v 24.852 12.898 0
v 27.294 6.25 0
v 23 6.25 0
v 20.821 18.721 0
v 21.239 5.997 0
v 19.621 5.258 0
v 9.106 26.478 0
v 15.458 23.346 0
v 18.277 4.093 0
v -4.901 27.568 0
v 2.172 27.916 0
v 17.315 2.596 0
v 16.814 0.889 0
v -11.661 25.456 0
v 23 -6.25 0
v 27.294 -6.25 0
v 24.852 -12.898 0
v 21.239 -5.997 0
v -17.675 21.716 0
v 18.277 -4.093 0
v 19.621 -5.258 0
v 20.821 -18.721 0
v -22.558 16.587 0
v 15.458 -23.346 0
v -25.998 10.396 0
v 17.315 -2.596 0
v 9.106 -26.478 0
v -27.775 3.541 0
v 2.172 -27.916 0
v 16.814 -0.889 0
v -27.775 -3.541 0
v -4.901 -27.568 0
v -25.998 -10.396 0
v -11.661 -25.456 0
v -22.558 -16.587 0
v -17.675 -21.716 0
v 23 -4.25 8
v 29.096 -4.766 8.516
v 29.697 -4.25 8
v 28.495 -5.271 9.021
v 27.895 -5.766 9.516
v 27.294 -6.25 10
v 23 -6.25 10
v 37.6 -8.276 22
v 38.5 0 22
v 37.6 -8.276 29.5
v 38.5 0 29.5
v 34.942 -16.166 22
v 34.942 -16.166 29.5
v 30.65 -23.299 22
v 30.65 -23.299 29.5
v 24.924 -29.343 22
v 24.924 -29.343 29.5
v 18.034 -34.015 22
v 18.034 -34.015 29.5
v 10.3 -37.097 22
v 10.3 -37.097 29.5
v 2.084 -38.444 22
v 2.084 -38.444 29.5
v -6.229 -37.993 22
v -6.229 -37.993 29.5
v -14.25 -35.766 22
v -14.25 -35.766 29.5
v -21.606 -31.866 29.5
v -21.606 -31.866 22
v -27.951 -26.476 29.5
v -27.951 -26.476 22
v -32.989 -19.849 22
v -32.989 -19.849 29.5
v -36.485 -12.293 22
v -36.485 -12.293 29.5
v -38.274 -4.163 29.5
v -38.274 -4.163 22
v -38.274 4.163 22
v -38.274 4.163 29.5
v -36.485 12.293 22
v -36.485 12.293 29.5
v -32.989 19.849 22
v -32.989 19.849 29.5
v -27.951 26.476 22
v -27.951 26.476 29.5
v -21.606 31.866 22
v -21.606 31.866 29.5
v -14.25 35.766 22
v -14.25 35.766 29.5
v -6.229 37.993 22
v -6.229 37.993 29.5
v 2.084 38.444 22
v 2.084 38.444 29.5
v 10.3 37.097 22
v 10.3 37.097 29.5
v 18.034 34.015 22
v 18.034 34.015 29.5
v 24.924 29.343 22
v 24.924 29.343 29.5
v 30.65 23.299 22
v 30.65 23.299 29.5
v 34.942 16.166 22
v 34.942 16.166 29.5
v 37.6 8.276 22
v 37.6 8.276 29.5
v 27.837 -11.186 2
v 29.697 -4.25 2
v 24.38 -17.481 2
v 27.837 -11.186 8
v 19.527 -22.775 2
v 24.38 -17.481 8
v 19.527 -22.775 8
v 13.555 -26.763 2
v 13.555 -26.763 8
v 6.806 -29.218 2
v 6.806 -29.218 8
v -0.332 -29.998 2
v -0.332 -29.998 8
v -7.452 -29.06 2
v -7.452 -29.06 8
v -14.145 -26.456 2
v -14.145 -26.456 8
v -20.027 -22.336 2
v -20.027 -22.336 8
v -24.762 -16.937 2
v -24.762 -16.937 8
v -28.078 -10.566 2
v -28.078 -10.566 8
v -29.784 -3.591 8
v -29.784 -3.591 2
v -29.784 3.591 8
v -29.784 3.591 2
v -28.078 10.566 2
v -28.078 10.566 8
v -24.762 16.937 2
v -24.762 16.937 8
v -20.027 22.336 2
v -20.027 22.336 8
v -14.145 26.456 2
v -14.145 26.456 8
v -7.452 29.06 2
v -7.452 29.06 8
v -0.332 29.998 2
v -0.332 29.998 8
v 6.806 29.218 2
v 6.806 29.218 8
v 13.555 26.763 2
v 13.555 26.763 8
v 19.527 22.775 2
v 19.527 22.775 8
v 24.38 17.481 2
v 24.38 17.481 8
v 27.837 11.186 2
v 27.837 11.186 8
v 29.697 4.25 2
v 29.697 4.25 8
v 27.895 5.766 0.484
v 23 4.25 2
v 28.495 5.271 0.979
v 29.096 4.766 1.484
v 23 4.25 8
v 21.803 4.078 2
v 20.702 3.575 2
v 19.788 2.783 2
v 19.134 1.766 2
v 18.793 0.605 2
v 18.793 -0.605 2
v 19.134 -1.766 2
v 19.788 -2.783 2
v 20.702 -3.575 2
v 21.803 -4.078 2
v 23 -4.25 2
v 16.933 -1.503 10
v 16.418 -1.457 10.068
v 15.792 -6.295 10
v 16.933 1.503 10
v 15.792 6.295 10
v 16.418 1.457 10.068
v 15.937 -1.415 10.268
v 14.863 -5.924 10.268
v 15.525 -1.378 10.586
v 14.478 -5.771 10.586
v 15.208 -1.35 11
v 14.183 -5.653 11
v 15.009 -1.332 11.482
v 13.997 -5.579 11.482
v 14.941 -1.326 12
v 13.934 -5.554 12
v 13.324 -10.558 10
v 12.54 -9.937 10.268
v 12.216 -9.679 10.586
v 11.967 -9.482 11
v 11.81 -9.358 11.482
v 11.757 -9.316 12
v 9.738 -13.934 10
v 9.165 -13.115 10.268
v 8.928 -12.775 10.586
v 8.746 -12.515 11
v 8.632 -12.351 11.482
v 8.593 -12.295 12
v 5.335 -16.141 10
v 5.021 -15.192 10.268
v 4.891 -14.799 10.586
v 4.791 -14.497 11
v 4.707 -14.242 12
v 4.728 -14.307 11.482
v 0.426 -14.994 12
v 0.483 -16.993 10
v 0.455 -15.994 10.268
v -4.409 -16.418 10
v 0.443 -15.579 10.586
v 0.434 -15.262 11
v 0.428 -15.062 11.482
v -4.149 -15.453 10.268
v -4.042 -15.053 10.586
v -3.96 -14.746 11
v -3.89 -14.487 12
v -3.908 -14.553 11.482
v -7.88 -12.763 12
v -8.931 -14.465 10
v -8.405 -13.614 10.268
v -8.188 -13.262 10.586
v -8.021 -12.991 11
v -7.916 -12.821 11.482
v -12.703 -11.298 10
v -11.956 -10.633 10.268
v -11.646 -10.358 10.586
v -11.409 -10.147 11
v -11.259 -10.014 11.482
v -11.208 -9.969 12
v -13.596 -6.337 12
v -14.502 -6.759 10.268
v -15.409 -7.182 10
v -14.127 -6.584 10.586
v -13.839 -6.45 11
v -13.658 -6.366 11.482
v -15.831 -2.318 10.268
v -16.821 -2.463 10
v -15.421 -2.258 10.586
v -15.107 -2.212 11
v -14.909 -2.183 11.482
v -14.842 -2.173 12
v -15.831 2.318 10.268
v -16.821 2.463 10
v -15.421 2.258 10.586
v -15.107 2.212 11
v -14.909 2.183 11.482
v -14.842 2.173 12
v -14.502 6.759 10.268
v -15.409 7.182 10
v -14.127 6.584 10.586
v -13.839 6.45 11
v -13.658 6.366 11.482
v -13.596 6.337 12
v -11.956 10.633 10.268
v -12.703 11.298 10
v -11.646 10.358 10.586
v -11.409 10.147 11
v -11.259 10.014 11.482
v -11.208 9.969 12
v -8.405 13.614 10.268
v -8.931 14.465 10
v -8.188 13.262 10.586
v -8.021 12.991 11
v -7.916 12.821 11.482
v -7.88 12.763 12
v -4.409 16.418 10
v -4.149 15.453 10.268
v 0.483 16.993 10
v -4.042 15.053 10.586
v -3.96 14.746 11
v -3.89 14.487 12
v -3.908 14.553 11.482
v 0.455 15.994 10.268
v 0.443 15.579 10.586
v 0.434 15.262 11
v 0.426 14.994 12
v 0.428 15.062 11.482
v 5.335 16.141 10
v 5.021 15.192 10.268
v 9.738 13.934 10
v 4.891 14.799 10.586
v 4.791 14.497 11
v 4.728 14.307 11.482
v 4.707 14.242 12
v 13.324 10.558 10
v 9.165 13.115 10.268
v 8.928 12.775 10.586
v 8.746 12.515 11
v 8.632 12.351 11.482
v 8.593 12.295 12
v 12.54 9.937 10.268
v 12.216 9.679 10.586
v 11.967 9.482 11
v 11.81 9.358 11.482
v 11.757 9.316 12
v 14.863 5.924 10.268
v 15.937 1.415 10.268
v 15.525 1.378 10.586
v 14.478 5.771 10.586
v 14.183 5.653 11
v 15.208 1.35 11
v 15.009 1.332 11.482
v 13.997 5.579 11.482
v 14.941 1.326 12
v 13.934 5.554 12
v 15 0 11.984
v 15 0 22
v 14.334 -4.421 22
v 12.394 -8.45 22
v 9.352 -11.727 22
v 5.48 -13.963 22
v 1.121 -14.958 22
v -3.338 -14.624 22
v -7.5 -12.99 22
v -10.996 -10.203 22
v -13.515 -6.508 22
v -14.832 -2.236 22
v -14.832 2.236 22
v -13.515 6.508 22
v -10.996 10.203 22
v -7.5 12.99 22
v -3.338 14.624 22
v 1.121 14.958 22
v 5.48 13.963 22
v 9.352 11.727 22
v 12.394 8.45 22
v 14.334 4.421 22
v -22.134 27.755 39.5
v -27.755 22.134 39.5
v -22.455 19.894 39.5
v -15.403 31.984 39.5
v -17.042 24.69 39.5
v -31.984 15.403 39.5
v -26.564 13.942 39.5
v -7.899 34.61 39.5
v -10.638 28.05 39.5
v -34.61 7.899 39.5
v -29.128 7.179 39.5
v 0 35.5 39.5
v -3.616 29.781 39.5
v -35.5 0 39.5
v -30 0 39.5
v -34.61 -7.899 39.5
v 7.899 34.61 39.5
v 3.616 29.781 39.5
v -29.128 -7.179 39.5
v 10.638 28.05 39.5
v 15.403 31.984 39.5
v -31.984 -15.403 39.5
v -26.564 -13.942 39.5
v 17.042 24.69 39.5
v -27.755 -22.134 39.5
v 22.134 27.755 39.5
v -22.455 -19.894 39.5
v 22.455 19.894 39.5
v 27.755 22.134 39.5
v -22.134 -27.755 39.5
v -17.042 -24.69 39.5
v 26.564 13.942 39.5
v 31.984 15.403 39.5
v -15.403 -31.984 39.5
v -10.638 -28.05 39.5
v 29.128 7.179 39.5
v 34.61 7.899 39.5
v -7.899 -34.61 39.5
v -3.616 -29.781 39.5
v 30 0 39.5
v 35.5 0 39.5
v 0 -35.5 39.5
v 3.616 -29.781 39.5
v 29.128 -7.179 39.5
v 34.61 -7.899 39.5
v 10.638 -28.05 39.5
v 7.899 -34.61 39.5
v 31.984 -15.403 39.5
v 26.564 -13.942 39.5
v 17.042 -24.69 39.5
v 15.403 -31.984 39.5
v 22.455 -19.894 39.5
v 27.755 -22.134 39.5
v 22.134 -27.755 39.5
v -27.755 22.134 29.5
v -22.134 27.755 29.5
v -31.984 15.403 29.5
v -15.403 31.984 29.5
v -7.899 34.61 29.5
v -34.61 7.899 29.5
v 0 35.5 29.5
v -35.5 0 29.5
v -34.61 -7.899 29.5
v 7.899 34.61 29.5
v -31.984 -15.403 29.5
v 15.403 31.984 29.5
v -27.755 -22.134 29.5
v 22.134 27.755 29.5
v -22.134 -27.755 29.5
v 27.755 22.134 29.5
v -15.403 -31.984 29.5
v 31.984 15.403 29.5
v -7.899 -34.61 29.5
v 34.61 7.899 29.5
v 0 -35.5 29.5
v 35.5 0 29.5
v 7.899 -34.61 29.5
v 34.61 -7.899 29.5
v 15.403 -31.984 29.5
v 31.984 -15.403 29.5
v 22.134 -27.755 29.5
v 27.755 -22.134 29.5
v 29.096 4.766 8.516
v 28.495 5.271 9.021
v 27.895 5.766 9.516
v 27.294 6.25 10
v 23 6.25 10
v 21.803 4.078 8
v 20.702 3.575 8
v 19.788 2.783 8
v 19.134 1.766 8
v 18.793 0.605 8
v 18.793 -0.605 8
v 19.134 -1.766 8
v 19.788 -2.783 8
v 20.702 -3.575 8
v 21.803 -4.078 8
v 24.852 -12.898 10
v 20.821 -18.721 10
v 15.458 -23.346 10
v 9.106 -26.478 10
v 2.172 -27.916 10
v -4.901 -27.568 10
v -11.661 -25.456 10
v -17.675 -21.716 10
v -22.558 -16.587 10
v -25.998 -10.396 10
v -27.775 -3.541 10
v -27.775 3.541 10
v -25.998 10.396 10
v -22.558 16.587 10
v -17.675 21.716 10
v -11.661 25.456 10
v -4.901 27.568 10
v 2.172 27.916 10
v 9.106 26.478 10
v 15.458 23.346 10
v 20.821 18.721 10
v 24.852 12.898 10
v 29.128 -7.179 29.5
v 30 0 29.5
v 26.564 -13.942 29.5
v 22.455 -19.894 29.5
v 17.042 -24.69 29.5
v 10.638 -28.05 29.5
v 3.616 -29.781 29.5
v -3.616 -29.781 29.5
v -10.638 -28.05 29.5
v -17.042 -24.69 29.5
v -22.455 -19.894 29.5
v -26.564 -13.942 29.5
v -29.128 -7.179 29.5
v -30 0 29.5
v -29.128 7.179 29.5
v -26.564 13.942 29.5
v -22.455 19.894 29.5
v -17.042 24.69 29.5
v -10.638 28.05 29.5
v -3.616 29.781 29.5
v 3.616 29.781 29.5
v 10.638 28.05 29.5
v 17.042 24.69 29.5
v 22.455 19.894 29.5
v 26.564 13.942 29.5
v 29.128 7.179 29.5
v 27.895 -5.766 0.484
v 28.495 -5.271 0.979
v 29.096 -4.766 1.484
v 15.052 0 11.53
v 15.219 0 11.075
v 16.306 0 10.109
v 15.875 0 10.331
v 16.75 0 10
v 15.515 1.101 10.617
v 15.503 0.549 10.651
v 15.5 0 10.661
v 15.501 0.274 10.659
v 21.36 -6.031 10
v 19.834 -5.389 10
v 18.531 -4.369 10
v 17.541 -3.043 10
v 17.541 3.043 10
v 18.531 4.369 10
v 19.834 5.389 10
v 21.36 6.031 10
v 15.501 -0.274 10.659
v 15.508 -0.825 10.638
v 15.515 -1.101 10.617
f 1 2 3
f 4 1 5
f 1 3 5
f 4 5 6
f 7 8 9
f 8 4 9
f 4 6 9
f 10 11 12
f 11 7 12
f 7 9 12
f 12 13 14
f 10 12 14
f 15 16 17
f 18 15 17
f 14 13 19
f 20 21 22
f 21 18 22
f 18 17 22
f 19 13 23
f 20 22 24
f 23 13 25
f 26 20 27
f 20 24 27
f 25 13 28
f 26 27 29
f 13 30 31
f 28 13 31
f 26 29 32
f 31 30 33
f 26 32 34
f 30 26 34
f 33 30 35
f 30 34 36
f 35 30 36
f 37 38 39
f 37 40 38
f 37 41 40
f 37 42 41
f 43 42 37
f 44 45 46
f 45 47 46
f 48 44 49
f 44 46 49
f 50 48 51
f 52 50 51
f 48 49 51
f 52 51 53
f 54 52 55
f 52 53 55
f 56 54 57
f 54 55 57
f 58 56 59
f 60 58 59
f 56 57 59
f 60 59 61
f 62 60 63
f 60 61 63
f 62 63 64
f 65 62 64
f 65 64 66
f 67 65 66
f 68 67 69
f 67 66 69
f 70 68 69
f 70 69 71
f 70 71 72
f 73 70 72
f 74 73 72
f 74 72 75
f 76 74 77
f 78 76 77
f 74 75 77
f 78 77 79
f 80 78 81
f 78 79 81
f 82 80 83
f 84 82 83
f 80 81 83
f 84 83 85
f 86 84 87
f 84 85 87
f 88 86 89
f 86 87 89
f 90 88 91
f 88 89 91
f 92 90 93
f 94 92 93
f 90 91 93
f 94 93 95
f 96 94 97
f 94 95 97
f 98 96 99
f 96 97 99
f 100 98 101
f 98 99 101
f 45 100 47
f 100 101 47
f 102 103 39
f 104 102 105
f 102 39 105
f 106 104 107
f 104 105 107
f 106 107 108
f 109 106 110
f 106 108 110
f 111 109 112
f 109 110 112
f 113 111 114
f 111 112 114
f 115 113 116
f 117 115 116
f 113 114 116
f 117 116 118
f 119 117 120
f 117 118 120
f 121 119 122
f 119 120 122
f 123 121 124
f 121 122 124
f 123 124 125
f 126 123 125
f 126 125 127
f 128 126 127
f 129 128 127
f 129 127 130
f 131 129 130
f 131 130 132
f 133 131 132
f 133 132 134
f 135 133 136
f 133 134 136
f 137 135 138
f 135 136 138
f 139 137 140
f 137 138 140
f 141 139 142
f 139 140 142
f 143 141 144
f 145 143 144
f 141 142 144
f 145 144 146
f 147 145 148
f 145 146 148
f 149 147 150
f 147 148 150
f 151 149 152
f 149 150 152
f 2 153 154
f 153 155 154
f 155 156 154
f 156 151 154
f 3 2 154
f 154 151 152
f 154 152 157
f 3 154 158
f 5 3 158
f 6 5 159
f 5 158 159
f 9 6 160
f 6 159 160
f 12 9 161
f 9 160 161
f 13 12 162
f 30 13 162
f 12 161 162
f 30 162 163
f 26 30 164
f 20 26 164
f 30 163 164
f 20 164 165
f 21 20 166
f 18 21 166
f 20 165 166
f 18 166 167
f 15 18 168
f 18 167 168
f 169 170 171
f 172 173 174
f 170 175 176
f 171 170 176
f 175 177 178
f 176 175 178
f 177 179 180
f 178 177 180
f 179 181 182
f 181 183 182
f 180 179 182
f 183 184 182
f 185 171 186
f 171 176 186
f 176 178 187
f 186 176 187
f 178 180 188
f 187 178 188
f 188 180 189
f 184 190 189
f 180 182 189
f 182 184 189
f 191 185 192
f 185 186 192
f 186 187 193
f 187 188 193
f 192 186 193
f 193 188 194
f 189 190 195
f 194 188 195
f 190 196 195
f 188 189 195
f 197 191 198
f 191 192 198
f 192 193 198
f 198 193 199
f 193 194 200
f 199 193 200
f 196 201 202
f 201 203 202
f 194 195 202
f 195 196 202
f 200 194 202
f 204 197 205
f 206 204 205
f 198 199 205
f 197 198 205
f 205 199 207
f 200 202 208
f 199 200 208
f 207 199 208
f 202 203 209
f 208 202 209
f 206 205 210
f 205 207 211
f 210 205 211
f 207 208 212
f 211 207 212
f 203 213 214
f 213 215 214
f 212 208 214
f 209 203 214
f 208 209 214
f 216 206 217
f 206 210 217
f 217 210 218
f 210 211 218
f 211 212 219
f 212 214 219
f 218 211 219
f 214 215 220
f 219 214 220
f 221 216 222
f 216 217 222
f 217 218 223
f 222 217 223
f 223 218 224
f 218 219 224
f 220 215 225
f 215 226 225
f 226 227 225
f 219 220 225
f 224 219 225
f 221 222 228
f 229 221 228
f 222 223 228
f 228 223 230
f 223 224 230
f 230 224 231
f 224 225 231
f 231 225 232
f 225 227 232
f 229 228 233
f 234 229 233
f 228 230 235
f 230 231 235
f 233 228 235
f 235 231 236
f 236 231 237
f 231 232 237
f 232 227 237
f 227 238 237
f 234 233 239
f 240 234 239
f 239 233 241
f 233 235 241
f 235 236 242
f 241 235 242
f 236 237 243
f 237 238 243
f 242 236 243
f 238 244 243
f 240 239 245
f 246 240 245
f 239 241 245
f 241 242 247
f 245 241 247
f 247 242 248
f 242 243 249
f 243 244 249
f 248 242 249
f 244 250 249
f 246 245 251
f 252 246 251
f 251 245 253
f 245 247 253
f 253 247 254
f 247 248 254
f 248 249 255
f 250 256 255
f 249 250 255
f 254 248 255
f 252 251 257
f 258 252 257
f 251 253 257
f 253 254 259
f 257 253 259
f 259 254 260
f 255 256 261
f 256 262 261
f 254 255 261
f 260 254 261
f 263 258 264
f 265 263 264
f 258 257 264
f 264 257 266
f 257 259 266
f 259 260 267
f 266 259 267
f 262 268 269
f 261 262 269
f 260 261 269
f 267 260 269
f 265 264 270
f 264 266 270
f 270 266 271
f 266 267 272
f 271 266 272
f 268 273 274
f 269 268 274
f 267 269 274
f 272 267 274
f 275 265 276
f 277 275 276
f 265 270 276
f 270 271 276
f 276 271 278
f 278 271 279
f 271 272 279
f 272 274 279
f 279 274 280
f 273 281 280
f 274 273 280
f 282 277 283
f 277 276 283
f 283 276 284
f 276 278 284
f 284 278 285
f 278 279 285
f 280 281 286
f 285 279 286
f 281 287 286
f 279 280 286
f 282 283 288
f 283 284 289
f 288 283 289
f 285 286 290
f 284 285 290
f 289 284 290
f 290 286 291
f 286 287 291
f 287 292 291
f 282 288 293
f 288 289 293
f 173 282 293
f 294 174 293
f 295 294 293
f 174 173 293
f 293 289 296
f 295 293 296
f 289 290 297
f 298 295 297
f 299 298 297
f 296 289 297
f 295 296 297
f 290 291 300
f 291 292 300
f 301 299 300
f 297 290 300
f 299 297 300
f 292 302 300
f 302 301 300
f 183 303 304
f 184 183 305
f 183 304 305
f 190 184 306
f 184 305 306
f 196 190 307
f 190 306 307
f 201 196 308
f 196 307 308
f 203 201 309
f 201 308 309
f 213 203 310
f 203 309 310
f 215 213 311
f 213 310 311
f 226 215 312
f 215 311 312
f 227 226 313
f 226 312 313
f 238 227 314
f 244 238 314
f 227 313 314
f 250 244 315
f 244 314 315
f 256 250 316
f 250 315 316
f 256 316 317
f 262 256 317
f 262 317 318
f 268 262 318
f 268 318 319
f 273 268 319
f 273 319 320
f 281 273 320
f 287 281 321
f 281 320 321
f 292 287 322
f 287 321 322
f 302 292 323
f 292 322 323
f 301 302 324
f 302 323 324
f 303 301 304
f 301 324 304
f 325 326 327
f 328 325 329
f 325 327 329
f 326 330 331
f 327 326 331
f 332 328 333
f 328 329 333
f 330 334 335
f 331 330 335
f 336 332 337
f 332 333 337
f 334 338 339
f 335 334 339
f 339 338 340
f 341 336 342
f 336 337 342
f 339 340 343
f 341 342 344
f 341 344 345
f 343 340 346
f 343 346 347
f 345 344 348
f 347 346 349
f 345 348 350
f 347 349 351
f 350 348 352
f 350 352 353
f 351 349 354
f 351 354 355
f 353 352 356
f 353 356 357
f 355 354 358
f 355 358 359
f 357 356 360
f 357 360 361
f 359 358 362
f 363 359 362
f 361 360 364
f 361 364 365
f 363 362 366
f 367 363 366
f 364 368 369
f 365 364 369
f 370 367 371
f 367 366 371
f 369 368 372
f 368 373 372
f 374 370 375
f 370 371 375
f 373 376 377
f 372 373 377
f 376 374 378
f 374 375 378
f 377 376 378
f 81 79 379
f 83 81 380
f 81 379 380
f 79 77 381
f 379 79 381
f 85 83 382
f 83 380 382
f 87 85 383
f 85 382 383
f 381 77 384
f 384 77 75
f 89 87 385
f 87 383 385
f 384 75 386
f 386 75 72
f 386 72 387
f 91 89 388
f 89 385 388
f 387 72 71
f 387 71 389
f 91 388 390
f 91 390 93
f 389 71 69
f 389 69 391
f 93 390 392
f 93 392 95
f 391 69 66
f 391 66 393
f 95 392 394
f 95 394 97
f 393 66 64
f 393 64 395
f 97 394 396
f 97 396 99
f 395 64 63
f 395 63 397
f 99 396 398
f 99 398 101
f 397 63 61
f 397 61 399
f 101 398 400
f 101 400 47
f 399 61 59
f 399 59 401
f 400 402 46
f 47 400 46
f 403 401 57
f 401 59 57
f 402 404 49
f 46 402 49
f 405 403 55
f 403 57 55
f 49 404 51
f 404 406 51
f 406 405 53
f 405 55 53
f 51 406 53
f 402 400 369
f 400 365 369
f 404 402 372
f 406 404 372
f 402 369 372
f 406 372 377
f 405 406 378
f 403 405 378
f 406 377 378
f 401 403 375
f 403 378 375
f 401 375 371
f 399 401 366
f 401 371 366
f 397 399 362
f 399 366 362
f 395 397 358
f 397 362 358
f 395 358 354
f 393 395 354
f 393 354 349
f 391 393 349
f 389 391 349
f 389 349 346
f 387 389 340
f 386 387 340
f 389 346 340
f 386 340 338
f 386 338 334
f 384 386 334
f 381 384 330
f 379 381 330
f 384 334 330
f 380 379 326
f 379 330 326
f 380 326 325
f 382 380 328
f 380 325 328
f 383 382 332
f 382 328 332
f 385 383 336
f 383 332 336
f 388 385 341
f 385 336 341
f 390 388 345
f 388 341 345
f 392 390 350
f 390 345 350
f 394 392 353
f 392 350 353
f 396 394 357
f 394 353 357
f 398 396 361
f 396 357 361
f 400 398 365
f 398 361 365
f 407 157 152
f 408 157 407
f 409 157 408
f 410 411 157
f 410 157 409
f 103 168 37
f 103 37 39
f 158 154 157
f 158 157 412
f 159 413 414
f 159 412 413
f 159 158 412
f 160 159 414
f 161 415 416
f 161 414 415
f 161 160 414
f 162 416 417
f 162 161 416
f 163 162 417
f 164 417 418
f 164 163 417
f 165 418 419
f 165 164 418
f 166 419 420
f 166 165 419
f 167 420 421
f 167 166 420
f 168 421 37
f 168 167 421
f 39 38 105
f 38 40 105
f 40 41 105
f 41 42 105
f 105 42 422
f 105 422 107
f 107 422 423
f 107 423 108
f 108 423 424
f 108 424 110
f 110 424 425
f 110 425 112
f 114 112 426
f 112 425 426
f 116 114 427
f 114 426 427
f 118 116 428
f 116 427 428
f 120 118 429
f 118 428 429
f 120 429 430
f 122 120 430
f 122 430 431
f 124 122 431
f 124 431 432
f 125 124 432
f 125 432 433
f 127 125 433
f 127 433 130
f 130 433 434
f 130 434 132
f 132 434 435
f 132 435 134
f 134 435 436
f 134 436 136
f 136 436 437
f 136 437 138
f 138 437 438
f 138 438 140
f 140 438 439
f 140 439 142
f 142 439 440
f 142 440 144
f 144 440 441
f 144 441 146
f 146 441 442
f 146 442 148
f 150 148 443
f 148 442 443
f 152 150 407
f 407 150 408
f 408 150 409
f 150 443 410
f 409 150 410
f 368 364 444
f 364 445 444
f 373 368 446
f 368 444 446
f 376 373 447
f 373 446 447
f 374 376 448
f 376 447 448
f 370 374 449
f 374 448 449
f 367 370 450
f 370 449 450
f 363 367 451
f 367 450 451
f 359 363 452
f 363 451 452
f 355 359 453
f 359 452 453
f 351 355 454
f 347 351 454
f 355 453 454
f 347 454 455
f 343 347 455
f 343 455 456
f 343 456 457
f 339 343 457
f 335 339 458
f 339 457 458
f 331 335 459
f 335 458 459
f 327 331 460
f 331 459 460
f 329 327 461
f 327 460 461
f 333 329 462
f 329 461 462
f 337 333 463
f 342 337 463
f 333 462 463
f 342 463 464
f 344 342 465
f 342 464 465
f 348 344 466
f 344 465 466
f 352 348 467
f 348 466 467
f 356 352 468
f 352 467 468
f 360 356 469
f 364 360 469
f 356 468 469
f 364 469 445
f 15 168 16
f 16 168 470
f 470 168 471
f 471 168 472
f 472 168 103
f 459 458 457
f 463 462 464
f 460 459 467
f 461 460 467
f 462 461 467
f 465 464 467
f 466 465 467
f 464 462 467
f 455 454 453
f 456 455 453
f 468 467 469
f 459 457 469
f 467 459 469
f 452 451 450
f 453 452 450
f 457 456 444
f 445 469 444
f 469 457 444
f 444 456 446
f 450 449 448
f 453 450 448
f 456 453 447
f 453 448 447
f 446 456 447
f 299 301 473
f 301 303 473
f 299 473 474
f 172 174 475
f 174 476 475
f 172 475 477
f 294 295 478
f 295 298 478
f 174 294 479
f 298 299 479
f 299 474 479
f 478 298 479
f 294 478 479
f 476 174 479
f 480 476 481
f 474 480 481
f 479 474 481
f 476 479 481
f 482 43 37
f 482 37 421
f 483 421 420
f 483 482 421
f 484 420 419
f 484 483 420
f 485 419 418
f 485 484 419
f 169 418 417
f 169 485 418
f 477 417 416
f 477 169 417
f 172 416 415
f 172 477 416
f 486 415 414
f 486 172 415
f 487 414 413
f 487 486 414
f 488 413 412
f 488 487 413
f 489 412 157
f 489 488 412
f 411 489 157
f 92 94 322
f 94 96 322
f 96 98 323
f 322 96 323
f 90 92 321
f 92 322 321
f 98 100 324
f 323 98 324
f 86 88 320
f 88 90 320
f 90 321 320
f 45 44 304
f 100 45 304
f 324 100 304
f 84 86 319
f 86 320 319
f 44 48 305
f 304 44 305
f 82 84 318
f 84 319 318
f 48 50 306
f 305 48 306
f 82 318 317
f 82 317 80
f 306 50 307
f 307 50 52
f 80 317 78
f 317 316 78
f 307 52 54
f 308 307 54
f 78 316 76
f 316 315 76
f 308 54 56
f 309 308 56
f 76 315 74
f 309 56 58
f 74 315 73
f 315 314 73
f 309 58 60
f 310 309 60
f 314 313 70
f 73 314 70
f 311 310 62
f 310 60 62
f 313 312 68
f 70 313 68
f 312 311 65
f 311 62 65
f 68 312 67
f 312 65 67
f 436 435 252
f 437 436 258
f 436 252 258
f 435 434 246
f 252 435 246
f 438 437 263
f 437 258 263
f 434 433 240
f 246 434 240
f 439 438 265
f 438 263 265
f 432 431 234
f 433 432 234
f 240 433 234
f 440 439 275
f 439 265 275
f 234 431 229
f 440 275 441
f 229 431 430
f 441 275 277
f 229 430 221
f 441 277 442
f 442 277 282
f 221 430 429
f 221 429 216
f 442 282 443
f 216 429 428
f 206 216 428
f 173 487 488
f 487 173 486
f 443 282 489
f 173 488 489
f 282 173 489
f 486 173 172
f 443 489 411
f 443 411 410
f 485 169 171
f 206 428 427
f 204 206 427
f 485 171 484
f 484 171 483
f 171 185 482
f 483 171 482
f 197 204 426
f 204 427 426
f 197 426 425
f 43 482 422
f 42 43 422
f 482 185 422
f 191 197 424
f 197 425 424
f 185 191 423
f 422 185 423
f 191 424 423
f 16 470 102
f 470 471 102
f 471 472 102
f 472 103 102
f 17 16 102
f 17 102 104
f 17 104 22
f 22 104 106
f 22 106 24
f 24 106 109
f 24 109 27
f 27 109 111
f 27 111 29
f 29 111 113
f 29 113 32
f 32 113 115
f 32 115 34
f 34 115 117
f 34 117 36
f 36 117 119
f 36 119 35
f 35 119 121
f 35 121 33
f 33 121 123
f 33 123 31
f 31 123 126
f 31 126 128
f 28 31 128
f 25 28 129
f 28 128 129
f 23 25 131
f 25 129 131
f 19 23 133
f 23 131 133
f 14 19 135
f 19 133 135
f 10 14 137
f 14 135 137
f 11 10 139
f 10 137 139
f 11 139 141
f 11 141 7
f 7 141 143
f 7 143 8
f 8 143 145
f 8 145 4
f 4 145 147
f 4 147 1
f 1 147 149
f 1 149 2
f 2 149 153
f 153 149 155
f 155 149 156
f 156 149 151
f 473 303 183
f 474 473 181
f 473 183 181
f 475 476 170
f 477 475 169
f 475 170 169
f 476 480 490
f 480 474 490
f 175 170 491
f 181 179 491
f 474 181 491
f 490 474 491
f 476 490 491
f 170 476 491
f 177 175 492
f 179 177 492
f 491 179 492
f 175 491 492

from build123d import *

# Parameters (mm, degrees)
F3_DEPTH = 25
F4_SIZE  = 2
F5_R     = 2


with BuildPart() as f1:
    # F0 (on Front) → F1 (revolve)
    with BuildSketch(Plane.XZ):
        Polygon((0, 22), (0, 0), (30, 0), (30, 10), (15, 10), (15, 22), align=None)
    revolve(axis=Axis((0, 0, 11), (0, 0, -1)))

    # F2 (on Top) → F3 (cut)
    with BuildSketch(Plane.XY):
        with BuildLine():
            ThreePointArc((23, -4.25), (26.005204, -3.005204), (27.25, 0))
            ThreePointArc((27.25, 0), (26.005204, 3.005204), (23, 4.25))
            ThreePointArc((23, 4.25), (18.75, 0), (23, -4.25))
        make_face()
        with BuildLine():
            ThreePointArc((23, 4.25), (26.005204, 3.005204), (27.25, 0))
            ThreePointArc((27.25, 0), (26.005204, -3.005204), (23, -4.25))
            Line((23, -4.25), (43, -4.25))
            Line((43, -4.25), (43, 4.25))
            Line((43, 4.25), (23, 4.25))
        make_face()
    extrude(amount=F3_DEPTH, mode=Mode.SUBTRACT)

    # F4
    f4_edges = [f1.edges().sort_by_distance(p)[0] for p in [
        (-30, 0, 0),
        (26.348716, -4.25, 0),
        (18.75, 0, 0),
        (-30, 0, 10),
        (18.75, 0, 10),
    ]]
    chamfer(f4_edges, length=F4_SIZE)

    # F5
    f5_edges = [f1.edges().sort_by_distance(p)[0] for p in [
        (-15, 0, 10),
    ]]
    fillet(f5_edges, radius=F5_R)

    # F0 (on Front) → F6 (revolve)
    with BuildSketch(Plane.XZ):
        Polygon((0, 29.5), (0, 22), (15, 22), (38.5, 22), (38.5, 29.5), (35.5, 29.5), (35.5, 39.5), (30, 39.5), (30, 29.5), align=None)
    revolve(axis=Axis((0, 0, 11), (0, 0, -1)))


solid = f1.part
